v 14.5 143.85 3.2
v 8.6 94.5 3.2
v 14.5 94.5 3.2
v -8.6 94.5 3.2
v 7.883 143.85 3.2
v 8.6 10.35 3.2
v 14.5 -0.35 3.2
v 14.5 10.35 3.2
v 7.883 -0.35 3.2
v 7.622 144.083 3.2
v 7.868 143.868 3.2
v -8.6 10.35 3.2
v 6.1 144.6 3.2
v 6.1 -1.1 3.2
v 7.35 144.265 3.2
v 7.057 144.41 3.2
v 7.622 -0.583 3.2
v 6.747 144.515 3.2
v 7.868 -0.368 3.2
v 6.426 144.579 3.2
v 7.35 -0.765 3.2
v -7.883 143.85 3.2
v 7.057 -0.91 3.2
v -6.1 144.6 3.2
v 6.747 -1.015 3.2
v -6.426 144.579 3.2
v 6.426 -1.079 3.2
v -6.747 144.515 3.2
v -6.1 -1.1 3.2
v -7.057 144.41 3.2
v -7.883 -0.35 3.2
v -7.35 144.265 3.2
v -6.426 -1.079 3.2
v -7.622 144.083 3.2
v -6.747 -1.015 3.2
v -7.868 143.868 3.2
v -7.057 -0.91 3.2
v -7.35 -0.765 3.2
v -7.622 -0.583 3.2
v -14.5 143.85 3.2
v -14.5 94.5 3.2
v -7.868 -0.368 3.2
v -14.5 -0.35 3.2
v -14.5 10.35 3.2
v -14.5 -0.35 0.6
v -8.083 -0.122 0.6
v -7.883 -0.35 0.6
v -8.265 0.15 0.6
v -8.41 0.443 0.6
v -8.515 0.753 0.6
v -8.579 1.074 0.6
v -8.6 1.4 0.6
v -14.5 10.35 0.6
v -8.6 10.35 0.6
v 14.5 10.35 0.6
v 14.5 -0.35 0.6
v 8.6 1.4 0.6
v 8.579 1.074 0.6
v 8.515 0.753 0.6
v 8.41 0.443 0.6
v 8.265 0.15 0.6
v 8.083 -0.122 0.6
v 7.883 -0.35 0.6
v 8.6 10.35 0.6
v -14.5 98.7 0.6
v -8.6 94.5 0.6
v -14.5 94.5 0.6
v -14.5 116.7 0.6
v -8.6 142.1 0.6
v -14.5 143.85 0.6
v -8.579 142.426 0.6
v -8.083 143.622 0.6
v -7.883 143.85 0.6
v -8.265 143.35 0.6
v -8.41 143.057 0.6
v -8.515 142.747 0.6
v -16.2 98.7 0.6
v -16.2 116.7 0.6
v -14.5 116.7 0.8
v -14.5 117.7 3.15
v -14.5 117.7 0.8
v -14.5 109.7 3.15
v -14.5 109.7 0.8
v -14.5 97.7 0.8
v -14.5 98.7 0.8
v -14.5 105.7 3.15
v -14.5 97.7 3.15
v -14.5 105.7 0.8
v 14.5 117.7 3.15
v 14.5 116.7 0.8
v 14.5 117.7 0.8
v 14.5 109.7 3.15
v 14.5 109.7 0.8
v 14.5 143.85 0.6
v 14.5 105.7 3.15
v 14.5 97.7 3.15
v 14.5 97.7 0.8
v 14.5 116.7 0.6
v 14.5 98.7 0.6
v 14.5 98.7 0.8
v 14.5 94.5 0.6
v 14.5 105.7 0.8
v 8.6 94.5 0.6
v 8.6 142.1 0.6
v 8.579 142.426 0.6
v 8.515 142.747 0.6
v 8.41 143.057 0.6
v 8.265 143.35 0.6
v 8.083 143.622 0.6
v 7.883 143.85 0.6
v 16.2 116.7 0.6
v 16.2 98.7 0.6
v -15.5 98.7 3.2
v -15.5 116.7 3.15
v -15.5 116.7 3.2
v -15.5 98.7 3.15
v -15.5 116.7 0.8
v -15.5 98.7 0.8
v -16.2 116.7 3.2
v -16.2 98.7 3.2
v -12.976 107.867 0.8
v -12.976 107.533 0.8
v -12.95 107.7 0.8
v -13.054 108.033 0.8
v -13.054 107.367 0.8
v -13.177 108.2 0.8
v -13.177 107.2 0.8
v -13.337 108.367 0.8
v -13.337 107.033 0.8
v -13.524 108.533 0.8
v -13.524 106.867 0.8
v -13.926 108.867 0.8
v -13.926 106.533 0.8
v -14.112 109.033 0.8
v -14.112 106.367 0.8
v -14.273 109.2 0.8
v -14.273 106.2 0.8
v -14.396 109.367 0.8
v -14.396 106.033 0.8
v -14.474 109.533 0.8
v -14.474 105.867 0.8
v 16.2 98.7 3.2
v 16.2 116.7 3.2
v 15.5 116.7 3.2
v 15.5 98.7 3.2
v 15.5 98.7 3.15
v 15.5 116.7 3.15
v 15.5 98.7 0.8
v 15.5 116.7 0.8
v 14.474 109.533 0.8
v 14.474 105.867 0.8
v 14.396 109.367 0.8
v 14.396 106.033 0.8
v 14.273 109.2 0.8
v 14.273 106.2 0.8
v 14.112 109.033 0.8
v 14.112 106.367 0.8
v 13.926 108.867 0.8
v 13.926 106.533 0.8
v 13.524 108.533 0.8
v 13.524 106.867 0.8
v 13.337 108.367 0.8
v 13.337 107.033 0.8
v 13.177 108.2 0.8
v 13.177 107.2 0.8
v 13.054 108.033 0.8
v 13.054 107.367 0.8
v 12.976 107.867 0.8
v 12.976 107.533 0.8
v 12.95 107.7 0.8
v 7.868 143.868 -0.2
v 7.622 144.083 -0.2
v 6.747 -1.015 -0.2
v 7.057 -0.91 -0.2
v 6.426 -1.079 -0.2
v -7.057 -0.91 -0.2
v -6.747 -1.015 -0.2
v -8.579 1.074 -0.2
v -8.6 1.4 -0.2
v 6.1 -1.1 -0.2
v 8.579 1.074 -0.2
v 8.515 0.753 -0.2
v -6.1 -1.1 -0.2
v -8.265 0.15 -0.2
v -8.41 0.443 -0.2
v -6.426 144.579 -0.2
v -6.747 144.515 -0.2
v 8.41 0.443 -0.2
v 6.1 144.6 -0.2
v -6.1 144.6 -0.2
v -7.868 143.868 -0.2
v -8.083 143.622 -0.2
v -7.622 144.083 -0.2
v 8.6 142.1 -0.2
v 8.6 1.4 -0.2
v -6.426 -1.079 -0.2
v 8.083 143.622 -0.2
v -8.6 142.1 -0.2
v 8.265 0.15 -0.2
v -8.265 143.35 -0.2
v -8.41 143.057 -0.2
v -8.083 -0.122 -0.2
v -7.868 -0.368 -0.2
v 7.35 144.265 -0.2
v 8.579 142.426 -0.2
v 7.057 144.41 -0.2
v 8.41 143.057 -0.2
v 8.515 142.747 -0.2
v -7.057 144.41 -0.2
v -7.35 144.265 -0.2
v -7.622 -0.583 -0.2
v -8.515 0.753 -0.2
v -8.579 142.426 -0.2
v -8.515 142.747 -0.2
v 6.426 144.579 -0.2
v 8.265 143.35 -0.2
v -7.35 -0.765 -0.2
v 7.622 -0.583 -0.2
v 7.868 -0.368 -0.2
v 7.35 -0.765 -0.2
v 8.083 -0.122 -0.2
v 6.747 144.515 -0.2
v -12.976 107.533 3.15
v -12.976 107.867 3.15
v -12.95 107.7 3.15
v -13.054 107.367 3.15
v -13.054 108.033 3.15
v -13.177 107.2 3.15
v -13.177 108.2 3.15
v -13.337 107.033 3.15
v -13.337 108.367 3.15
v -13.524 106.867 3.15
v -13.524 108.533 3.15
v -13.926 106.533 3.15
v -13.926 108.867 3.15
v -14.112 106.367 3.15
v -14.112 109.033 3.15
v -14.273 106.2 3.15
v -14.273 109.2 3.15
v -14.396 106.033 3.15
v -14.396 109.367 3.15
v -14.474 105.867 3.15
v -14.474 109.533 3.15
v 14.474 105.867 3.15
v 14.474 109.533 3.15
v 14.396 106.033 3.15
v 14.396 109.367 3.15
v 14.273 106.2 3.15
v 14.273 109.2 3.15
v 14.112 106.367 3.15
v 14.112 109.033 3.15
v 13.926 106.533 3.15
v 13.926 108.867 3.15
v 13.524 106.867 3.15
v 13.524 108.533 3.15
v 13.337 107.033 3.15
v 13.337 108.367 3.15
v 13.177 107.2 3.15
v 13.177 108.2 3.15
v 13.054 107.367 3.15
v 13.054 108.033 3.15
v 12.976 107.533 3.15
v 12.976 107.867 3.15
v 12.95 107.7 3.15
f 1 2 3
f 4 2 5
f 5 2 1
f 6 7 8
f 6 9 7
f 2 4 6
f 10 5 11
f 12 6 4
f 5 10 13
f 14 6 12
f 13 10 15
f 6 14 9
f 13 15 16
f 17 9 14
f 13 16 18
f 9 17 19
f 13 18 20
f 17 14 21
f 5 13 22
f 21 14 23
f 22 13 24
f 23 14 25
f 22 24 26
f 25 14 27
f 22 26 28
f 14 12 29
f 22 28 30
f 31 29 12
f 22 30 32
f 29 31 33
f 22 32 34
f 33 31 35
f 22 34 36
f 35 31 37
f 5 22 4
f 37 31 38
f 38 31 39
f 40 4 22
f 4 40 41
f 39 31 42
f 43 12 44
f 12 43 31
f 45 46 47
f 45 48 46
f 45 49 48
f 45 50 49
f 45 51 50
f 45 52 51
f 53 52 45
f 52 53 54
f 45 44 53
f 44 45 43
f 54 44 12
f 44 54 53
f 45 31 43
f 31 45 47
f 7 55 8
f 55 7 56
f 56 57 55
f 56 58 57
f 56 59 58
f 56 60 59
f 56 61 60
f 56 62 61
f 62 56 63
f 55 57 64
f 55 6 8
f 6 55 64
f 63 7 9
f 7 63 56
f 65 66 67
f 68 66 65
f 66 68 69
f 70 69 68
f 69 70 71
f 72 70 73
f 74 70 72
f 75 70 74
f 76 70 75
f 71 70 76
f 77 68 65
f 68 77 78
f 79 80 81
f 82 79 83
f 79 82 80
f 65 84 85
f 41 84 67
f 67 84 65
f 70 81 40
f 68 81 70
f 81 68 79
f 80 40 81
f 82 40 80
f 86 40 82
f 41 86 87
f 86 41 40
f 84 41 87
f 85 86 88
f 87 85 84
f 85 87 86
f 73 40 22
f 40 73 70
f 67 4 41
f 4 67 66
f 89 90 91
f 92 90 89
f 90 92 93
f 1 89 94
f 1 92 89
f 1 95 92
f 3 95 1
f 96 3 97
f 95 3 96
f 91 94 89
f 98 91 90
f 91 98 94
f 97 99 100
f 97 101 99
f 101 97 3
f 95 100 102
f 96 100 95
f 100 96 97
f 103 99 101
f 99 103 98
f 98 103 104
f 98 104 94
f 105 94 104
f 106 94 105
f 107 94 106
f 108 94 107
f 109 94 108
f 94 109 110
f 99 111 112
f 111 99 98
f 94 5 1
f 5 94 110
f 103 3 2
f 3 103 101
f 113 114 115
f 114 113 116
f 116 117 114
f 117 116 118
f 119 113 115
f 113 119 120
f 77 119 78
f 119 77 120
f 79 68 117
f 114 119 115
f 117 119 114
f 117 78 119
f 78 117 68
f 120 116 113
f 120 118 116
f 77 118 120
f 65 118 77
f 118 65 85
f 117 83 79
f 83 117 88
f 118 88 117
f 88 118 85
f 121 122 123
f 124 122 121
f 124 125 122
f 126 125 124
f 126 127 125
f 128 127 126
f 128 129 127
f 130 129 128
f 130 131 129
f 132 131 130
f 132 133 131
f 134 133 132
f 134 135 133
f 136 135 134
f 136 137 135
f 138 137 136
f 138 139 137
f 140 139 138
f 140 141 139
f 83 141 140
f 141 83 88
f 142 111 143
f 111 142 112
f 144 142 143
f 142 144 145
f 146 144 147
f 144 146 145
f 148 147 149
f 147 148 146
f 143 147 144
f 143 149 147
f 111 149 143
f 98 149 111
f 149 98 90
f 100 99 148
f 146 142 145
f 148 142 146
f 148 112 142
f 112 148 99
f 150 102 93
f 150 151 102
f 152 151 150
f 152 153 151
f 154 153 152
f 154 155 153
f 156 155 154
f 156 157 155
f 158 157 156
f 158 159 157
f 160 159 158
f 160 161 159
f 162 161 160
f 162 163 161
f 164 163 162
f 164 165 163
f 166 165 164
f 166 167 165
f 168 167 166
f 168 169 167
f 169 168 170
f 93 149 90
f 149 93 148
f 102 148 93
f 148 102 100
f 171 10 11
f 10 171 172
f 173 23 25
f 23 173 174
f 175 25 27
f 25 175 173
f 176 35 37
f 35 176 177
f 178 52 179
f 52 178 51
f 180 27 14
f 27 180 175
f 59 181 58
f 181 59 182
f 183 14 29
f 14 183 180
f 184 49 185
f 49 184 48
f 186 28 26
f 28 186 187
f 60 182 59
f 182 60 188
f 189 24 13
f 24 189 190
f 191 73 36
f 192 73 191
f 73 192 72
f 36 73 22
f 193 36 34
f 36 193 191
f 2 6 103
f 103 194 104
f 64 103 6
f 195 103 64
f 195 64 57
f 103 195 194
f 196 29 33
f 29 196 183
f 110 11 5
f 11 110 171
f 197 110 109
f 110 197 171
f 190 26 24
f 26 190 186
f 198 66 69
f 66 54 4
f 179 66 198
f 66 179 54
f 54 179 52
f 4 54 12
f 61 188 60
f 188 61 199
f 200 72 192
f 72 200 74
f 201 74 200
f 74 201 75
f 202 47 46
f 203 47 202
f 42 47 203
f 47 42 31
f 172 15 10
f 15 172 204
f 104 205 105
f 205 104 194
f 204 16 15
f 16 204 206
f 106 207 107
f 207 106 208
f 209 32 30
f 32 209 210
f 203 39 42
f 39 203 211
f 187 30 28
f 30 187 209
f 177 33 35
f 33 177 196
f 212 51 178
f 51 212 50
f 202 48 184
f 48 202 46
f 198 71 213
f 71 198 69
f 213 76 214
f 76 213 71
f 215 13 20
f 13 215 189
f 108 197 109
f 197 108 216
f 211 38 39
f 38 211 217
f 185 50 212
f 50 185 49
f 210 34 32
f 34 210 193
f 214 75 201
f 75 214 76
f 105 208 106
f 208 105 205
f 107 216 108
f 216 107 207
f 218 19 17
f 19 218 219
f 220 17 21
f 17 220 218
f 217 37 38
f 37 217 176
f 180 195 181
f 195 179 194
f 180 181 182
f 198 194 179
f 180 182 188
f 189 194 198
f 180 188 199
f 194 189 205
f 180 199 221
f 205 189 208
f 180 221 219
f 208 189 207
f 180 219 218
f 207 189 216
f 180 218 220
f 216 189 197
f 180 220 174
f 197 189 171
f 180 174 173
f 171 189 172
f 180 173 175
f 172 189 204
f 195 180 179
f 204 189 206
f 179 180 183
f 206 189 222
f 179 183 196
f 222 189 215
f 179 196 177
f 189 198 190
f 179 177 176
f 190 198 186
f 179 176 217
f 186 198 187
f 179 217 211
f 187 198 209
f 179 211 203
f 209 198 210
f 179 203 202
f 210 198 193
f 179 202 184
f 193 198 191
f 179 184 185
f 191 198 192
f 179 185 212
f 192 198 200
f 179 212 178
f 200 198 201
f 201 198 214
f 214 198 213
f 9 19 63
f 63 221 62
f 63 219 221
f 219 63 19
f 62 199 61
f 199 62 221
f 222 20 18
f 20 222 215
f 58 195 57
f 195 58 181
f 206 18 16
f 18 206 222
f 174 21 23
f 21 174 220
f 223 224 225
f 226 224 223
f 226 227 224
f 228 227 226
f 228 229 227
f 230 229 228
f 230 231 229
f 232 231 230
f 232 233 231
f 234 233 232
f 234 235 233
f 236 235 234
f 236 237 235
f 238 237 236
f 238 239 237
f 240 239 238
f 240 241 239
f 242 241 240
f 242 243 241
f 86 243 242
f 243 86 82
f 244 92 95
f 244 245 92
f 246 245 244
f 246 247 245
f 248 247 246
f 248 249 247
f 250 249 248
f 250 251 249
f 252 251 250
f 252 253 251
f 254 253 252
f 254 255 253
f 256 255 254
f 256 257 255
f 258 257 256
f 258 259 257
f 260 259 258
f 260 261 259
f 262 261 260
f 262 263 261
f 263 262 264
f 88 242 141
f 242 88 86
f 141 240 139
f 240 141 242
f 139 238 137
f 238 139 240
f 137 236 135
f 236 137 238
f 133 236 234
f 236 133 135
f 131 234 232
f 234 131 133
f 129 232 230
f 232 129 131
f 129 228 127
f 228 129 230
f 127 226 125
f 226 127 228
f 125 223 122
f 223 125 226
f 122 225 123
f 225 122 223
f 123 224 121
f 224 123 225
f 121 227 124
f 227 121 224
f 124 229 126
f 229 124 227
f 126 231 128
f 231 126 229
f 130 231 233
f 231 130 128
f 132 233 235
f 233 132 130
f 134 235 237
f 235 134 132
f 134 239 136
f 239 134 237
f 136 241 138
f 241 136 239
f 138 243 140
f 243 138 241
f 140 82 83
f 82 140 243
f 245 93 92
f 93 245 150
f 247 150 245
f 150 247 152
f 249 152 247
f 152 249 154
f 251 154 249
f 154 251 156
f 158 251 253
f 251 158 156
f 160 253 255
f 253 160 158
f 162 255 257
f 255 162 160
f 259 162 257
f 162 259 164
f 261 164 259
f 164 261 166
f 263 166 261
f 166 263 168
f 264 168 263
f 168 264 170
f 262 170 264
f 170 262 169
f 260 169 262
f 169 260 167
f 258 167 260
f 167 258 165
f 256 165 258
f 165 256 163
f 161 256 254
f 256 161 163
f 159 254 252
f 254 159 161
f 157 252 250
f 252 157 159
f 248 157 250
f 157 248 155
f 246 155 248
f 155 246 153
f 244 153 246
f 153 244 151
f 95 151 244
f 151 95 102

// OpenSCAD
// file: strap_system_parameters.scad
/*
  Shared dimensions for the sliding strap and its rigid-case negative modifier.
  Units: millimetres.

  IMPORTANT COUPLED DIMENSIONS:
  - strap_length, strap_moving_ear_length, strap_travel and track_hard_stop_overtravel
    define both the moving ear position and the lower end of its guide track.
  - strap_stow_notch_offset and strap_travel define the deployed detent/spring position.
  - track_center_spacing, track_width and ear_width define the lateral fit.
  Change these here once. Both strap_parametric.scad and
  strap_housing_negative.scad include this file.

  Reference dimensions reproduce the physically tested S25 Ultra strap geometry.
  For another phone, adapt these dimensions to its usable rear panel.
*/

// Main flexible band (print bed is z=0; band extends to +Z)
strap_length = 143.50;
strap_band_width = 16.60;
strap_thickness = 2.60;
strap_corner_radius = 2.00;

// Ears (two per end, one in each side track)
// The ear must overlap the band to stay attached, so the ear centres are derived
// from the band width rather than set independently: the inner edge of each ear
// sits `strap_ear_band_overlap` inside the band edge. Narrowing the band
// therefore brings the ears inboard with it, and the tracks follow from the ears
// further down this file. Changing only strap_band_width is safe; changing
// strap_ear_center_spacing by hand is not, and the assertion at the end of this
// file rejects a strap whose ears would tear off the band.
strap_ear_width = 6.00;
strap_ear_band_overlap = 0.60;
strap_ear_center_spacing = strap_band_width - 2*strap_ear_band_overlap + strap_ear_width;
strap_ear_thickness = 1.85;
strap_fixed_ear_length = 10.00;
strap_moving_ear_length = 15.80;
strap_ear_corner_radius = 1.20;
strap_fixed_socket_clearance = 0.35;

// Motion and locking: these values MUST stay coupled between strap and housing.
strap_travel = 33.00;
track_hard_stop_overtravel = 0.20;
strap_stow_notch_offset = 2.80;  // notch centre behind moving end in stowed position
strap_notch_length = 4.60;
strap_notch_corner_radius = 0.65;
strap_detent_lateral_clearance = 0.25;
strap_detent_nose_depth = 1.55;

// Flexure grooves in the TPU strap. Grooves are only across the flexible span.
strap_groove_pitch = 3.15;
// Groove count is derived from the available flexible span so changed strap lengths
// keep the same nominal pitch without crossing into either ear transition.
strap_groove_mouth = 1.80;
strap_groove_depth = 1.45;
strap_groove_cut_below_face = 0.15;
strap_groove_end_transition = 4.40;

// Negative modifier geometry for the rigid case.
// The lateral clearance is the gap between each side of the ear and its track.
// 0.80 mm = two 0.40 mm extrusion widths, so a slicer leaves it as a real void
// instead of filling a sub-line-width gap. Track spacing and width are derived
// from the ear so this can never drift out of step with the strap.
strap_track_lateral_clearance = 0.80;
track_center_spacing = strap_ear_center_spacing + strap_track_lateral_clearance;
track_width = strap_ear_width + strap_track_lateral_clearance;
track_floor_thickness = 0.60;
backplate_thickness = 2.65;
negative_cut_overrun = 0.55; // extend cut past top surface for robust boolean subtraction
// The window follows the band so a narrower strap cannot leave a gap either side.
strap_window_side_clearance = 0.30;
strap_window_width = strap_band_width + 2*strap_window_side_clearance;
strap_window_end_clearance = 1.10;
strap_window_corner_radius = 2.50;

// Vertical clearance below the spring beam. The 0.20 mm default was tested by
// the project owner with a 0.20 mm layer profile and a 0.6 mm nozzle when the
// housing is applied as a slicer negative-volume modifier. Other printers and
// materials may need a larger value; inspect the actual bridge toolpath.
spring_air_gap = 0.20;
spring_body_width = 1.00;
spring_relief_width = 0.70;
spring_beam_half_length = 10.00;
spring_relief_half_length = 9.00; // leaves 1 mm anchored bridge at either end
spring_nose_half_length = 2.00;
spring_nose_samples = 24;

// Derived shared positions. Do not duplicate these formulas in a second file.
track_outer_x = track_center_spacing/2 + track_width/2;
track_inner_x = track_center_spacing/2 - track_width/2;
strap_band_half_width = strap_band_width/2;
strap_ear_center_x = strap_ear_center_spacing/2;

strap_fixed_ear_y0 = 0;
strap_fixed_ear_y1 = strap_fixed_ear_length;
strap_moving_ear_y0_stowed = strap_length - strap_moving_ear_length;
strap_moving_ear_y1_stowed = strap_length;

// Track range includes the entire moving ear at both end positions.
track_y_min = strap_length - strap_moving_ear_length - strap_travel - track_hard_stop_overtravel;
track_y_max = strap_length + 0.35;

// Detent engages after 33 mm travel; track hard stop is 0.20 mm farther on.
strap_notch_y_stowed = strap_length - strap_stow_notch_offset;
spring_detent_y = strap_notch_y_stowed - strap_travel;

// Flex grooves leave an ungrooved transition next to both ear groups.
strap_groove_min_center_y = strap_fixed_ear_length + strap_groove_end_transition + strap_groove_mouth/2;
strap_groove_max_center_y = strap_moving_ear_y0_stowed - strap_groove_end_transition - strap_groove_mouth/2;
strap_groove_count = max(2, floor((strap_groove_max_center_y-strap_groove_min_center_y)/strap_groove_pitch)+1);
// Centre the count * pitch array within the allowed bending span.
strap_groove_first_y = (strap_groove_min_center_y+strap_groove_max_center_y-(strap_groove_count-1)*strap_groove_pitch)/2;
strap_groove_last_y = strap_groove_first_y + (strap_groove_count-1)*strap_groove_pitch;

// Negative modifier apertures / sockets.
strap_window_length = strap_length + 2*strap_window_end_clearance;
strap_window_y0 = -strap_window_end_clearance;
strap_window_y1 = strap_length + strap_window_end_clearance;
track_fixed_socket_y0 = strap_fixed_ear_y0 - strap_fixed_socket_clearance;
track_fixed_socket_y1 = strap_fixed_ear_y1 + strap_fixed_socket_clearance;

// ---------------------------------------------------------------------------
// Coupling assertions. These stop OpenSCAD with a readable message instead of
// rendering a strap or housing that cannot work.
// ---------------------------------------------------------------------------

// The ear must overlap the band by enough material to survive being pulled.
assert(strap_ear_band_overlap >= 0.40,
       str("strap_ear_band_overlap is ", strap_ear_band_overlap,
           " mm - the ears would tear off the band. Widen the band or narrow the ears."));
assert(strap_ear_band_overlap < strap_ear_width,
       "strap_ear_band_overlap must be smaller than strap_ear_width.");

// A gap narrower than one extrusion width gets filled by the slicer and the ear
// fuses to its track. 0.80 mm is two 0.40 mm passes.
assert(strap_track_lateral_clearance >= 0.40,
       str("strap_track_lateral_clearance is ", strap_track_lateral_clearance,
           " mm - the ear would fuse to the track. Use at least 0.40, ideally 0.80."));
assert(track_width > strap_ear_width,
       "track_width must be wider than the ear.");

// Geometry that would not resolve: the window must be at least as wide as the
// band it shows. (The tracks deliberately overlap the window's X range - that is
// where each ear joins the band - so there is nothing to assert there.)
assert(strap_window_width >= strap_band_width,
       "strap_window_width is narrower than the band.");
// main file
/*
  NEGATIVE VOLUME for a rigid phone-case back panel.

  Subtract this shape from the PHONE/INNER side of a rigid rear panel. It creates:
    - a through-window for the visible TPU strap band;
    - two phone-side-open ear tracks and the fixed-end ear sockets;
    - the spring relief pockets and spring_air_gap clearance below each spring beam.

  The spring beams themselves are NOT removed: the difference() at the end
  preserves their material, so they remain attached at their end bridges.

  IMPORTANT SLICER NOTE:
  The shared parameter file defaults spring_air_gap to 0.20 mm. The project owner
  verified this value in their 0.20 mm layer / 0.6 mm nozzle slicer workflow after
  regenerating the negative-volume STL. Automatic variable layer height does not
  inspect features that exist only in a negative modifier, so do not rely on it to
  create a layer boundary in this gap. Inspect the generated bridge paths. Increase
  the parameter and regenerate the STL if your printer/material/profile fuses the
  beam to the floor. A 0.40 mm setting is a more conservative two-layer option.

  The phone closes the tracks after insertion. Do not add a roof on the phone side.
*/
include <strap_system_parameters.scad>;

$fn = 48;

module rounded_rect_2d(w,h,r) {
    rr = min(r,min(w,h)/2-0.01);
    offset(r=rr) square([w-2*rr,h-2*rr],center=true);
}

module rounded_box_at(cx,cy,w,h,z0,z1,r) {
    translate([cx,cy,z0]) linear_extrude(height=z1-z0)
        rounded_rect_2d(w,h,r);
}

module box_at(cx,cy,w,h,z0,z1) {
    translate([cx-w/2,cy-h/2,z0]) cube([w,h,z1-z0],center=false);
}

module central_strap_window() {
    // Slightly larger than the strap band; through-cut plus a small vertical overrun.
    rounded_box_at(0,strap_length/2,strap_window_width,strap_window_length,
                   -0.20,backplate_thickness+negative_cut_overrun,
                   strap_window_corner_radius);
}

module fixed_ear_sockets() {
    for (side=[-1,1])
        box_at(side*track_center_spacing/2,
               (track_fixed_socket_y0+track_fixed_socket_y1)/2,
               track_width,
               track_fixed_socket_y1-track_fixed_socket_y0,
               track_floor_thickness,backplate_thickness+negative_cut_overrun);
}

module moving_ear_tracks() {
    for (side=[-1,1])
        box_at(side*track_center_spacing/2,
               (track_y_min+track_y_max)/2,
               track_width,track_y_max-track_y_min,
               track_floor_thickness,backplate_thickness+negative_cut_overrun);
}

module spring_relief_cavities() {
    for (side=[-1,1]) {
        // Outer-side cavity beside spring body. End bridges remain for anchoring.
        box_at(side*(track_outer_x+spring_body_width+spring_relief_width/2),
               spring_detent_y,
               spring_relief_width,2*spring_relief_half_length,
               track_floor_thickness,backplate_thickness+negative_cut_overrun);
        // spring_air_gap separation under the moving beam span. The spring begins at
        // track_floor_thickness + spring_air_gap and does not touch the floor.
        box_at(side*(track_outer_x+spring_body_width/2),
               spring_detent_y,
               spring_body_width,2*spring_relief_half_length,
               track_floor_thickness,track_floor_thickness+spring_air_gap);
    }
}

module left_spring_profile_2d() {
    y0=spring_detent_y-spring_beam_half_length;
    y1=spring_detent_y+spring_beam_half_length;
    n0=spring_detent_y-spring_nose_half_length;
    n1=spring_detent_y+spring_nose_half_length;
    boundary=-track_outer_x;
    outer=boundary-spring_body_width;
    pts = concat(
        [[outer,y0],[boundary,y0],[boundary,n0]],
        [for(i=[0:spring_nose_samples]) let(y=n0+(n1-n0)*i/spring_nose_samples)
            [boundary+strap_detent_nose_depth*pow(cos(90*(y-spring_detent_y)/spring_nose_half_length),2),y]],
        [[boundary,y1],[outer,y1]]
    );
    polygon(pts);
}

module spring_keepout_material() {
    // Protect spring material from the union of negative cavities. The cosine
    // nose is the only part protruding into the track path.
    translate([0,0,track_floor_thickness+spring_air_gap])
        linear_extrude(height=3.15-(track_floor_thickness+spring_air_gap)) {
            left_spring_profile_2d();
            mirror([1,0,0]) left_spring_profile_2d();
        }
}

module strap_housing_negative() {
    difference() {
        union() {
            central_strap_window();
            fixed_ear_sockets();
            moving_ear_tracks();
            spring_relief_cavities();
        }
        spring_keepout_material();
    }
}

strap_housing_negative();
